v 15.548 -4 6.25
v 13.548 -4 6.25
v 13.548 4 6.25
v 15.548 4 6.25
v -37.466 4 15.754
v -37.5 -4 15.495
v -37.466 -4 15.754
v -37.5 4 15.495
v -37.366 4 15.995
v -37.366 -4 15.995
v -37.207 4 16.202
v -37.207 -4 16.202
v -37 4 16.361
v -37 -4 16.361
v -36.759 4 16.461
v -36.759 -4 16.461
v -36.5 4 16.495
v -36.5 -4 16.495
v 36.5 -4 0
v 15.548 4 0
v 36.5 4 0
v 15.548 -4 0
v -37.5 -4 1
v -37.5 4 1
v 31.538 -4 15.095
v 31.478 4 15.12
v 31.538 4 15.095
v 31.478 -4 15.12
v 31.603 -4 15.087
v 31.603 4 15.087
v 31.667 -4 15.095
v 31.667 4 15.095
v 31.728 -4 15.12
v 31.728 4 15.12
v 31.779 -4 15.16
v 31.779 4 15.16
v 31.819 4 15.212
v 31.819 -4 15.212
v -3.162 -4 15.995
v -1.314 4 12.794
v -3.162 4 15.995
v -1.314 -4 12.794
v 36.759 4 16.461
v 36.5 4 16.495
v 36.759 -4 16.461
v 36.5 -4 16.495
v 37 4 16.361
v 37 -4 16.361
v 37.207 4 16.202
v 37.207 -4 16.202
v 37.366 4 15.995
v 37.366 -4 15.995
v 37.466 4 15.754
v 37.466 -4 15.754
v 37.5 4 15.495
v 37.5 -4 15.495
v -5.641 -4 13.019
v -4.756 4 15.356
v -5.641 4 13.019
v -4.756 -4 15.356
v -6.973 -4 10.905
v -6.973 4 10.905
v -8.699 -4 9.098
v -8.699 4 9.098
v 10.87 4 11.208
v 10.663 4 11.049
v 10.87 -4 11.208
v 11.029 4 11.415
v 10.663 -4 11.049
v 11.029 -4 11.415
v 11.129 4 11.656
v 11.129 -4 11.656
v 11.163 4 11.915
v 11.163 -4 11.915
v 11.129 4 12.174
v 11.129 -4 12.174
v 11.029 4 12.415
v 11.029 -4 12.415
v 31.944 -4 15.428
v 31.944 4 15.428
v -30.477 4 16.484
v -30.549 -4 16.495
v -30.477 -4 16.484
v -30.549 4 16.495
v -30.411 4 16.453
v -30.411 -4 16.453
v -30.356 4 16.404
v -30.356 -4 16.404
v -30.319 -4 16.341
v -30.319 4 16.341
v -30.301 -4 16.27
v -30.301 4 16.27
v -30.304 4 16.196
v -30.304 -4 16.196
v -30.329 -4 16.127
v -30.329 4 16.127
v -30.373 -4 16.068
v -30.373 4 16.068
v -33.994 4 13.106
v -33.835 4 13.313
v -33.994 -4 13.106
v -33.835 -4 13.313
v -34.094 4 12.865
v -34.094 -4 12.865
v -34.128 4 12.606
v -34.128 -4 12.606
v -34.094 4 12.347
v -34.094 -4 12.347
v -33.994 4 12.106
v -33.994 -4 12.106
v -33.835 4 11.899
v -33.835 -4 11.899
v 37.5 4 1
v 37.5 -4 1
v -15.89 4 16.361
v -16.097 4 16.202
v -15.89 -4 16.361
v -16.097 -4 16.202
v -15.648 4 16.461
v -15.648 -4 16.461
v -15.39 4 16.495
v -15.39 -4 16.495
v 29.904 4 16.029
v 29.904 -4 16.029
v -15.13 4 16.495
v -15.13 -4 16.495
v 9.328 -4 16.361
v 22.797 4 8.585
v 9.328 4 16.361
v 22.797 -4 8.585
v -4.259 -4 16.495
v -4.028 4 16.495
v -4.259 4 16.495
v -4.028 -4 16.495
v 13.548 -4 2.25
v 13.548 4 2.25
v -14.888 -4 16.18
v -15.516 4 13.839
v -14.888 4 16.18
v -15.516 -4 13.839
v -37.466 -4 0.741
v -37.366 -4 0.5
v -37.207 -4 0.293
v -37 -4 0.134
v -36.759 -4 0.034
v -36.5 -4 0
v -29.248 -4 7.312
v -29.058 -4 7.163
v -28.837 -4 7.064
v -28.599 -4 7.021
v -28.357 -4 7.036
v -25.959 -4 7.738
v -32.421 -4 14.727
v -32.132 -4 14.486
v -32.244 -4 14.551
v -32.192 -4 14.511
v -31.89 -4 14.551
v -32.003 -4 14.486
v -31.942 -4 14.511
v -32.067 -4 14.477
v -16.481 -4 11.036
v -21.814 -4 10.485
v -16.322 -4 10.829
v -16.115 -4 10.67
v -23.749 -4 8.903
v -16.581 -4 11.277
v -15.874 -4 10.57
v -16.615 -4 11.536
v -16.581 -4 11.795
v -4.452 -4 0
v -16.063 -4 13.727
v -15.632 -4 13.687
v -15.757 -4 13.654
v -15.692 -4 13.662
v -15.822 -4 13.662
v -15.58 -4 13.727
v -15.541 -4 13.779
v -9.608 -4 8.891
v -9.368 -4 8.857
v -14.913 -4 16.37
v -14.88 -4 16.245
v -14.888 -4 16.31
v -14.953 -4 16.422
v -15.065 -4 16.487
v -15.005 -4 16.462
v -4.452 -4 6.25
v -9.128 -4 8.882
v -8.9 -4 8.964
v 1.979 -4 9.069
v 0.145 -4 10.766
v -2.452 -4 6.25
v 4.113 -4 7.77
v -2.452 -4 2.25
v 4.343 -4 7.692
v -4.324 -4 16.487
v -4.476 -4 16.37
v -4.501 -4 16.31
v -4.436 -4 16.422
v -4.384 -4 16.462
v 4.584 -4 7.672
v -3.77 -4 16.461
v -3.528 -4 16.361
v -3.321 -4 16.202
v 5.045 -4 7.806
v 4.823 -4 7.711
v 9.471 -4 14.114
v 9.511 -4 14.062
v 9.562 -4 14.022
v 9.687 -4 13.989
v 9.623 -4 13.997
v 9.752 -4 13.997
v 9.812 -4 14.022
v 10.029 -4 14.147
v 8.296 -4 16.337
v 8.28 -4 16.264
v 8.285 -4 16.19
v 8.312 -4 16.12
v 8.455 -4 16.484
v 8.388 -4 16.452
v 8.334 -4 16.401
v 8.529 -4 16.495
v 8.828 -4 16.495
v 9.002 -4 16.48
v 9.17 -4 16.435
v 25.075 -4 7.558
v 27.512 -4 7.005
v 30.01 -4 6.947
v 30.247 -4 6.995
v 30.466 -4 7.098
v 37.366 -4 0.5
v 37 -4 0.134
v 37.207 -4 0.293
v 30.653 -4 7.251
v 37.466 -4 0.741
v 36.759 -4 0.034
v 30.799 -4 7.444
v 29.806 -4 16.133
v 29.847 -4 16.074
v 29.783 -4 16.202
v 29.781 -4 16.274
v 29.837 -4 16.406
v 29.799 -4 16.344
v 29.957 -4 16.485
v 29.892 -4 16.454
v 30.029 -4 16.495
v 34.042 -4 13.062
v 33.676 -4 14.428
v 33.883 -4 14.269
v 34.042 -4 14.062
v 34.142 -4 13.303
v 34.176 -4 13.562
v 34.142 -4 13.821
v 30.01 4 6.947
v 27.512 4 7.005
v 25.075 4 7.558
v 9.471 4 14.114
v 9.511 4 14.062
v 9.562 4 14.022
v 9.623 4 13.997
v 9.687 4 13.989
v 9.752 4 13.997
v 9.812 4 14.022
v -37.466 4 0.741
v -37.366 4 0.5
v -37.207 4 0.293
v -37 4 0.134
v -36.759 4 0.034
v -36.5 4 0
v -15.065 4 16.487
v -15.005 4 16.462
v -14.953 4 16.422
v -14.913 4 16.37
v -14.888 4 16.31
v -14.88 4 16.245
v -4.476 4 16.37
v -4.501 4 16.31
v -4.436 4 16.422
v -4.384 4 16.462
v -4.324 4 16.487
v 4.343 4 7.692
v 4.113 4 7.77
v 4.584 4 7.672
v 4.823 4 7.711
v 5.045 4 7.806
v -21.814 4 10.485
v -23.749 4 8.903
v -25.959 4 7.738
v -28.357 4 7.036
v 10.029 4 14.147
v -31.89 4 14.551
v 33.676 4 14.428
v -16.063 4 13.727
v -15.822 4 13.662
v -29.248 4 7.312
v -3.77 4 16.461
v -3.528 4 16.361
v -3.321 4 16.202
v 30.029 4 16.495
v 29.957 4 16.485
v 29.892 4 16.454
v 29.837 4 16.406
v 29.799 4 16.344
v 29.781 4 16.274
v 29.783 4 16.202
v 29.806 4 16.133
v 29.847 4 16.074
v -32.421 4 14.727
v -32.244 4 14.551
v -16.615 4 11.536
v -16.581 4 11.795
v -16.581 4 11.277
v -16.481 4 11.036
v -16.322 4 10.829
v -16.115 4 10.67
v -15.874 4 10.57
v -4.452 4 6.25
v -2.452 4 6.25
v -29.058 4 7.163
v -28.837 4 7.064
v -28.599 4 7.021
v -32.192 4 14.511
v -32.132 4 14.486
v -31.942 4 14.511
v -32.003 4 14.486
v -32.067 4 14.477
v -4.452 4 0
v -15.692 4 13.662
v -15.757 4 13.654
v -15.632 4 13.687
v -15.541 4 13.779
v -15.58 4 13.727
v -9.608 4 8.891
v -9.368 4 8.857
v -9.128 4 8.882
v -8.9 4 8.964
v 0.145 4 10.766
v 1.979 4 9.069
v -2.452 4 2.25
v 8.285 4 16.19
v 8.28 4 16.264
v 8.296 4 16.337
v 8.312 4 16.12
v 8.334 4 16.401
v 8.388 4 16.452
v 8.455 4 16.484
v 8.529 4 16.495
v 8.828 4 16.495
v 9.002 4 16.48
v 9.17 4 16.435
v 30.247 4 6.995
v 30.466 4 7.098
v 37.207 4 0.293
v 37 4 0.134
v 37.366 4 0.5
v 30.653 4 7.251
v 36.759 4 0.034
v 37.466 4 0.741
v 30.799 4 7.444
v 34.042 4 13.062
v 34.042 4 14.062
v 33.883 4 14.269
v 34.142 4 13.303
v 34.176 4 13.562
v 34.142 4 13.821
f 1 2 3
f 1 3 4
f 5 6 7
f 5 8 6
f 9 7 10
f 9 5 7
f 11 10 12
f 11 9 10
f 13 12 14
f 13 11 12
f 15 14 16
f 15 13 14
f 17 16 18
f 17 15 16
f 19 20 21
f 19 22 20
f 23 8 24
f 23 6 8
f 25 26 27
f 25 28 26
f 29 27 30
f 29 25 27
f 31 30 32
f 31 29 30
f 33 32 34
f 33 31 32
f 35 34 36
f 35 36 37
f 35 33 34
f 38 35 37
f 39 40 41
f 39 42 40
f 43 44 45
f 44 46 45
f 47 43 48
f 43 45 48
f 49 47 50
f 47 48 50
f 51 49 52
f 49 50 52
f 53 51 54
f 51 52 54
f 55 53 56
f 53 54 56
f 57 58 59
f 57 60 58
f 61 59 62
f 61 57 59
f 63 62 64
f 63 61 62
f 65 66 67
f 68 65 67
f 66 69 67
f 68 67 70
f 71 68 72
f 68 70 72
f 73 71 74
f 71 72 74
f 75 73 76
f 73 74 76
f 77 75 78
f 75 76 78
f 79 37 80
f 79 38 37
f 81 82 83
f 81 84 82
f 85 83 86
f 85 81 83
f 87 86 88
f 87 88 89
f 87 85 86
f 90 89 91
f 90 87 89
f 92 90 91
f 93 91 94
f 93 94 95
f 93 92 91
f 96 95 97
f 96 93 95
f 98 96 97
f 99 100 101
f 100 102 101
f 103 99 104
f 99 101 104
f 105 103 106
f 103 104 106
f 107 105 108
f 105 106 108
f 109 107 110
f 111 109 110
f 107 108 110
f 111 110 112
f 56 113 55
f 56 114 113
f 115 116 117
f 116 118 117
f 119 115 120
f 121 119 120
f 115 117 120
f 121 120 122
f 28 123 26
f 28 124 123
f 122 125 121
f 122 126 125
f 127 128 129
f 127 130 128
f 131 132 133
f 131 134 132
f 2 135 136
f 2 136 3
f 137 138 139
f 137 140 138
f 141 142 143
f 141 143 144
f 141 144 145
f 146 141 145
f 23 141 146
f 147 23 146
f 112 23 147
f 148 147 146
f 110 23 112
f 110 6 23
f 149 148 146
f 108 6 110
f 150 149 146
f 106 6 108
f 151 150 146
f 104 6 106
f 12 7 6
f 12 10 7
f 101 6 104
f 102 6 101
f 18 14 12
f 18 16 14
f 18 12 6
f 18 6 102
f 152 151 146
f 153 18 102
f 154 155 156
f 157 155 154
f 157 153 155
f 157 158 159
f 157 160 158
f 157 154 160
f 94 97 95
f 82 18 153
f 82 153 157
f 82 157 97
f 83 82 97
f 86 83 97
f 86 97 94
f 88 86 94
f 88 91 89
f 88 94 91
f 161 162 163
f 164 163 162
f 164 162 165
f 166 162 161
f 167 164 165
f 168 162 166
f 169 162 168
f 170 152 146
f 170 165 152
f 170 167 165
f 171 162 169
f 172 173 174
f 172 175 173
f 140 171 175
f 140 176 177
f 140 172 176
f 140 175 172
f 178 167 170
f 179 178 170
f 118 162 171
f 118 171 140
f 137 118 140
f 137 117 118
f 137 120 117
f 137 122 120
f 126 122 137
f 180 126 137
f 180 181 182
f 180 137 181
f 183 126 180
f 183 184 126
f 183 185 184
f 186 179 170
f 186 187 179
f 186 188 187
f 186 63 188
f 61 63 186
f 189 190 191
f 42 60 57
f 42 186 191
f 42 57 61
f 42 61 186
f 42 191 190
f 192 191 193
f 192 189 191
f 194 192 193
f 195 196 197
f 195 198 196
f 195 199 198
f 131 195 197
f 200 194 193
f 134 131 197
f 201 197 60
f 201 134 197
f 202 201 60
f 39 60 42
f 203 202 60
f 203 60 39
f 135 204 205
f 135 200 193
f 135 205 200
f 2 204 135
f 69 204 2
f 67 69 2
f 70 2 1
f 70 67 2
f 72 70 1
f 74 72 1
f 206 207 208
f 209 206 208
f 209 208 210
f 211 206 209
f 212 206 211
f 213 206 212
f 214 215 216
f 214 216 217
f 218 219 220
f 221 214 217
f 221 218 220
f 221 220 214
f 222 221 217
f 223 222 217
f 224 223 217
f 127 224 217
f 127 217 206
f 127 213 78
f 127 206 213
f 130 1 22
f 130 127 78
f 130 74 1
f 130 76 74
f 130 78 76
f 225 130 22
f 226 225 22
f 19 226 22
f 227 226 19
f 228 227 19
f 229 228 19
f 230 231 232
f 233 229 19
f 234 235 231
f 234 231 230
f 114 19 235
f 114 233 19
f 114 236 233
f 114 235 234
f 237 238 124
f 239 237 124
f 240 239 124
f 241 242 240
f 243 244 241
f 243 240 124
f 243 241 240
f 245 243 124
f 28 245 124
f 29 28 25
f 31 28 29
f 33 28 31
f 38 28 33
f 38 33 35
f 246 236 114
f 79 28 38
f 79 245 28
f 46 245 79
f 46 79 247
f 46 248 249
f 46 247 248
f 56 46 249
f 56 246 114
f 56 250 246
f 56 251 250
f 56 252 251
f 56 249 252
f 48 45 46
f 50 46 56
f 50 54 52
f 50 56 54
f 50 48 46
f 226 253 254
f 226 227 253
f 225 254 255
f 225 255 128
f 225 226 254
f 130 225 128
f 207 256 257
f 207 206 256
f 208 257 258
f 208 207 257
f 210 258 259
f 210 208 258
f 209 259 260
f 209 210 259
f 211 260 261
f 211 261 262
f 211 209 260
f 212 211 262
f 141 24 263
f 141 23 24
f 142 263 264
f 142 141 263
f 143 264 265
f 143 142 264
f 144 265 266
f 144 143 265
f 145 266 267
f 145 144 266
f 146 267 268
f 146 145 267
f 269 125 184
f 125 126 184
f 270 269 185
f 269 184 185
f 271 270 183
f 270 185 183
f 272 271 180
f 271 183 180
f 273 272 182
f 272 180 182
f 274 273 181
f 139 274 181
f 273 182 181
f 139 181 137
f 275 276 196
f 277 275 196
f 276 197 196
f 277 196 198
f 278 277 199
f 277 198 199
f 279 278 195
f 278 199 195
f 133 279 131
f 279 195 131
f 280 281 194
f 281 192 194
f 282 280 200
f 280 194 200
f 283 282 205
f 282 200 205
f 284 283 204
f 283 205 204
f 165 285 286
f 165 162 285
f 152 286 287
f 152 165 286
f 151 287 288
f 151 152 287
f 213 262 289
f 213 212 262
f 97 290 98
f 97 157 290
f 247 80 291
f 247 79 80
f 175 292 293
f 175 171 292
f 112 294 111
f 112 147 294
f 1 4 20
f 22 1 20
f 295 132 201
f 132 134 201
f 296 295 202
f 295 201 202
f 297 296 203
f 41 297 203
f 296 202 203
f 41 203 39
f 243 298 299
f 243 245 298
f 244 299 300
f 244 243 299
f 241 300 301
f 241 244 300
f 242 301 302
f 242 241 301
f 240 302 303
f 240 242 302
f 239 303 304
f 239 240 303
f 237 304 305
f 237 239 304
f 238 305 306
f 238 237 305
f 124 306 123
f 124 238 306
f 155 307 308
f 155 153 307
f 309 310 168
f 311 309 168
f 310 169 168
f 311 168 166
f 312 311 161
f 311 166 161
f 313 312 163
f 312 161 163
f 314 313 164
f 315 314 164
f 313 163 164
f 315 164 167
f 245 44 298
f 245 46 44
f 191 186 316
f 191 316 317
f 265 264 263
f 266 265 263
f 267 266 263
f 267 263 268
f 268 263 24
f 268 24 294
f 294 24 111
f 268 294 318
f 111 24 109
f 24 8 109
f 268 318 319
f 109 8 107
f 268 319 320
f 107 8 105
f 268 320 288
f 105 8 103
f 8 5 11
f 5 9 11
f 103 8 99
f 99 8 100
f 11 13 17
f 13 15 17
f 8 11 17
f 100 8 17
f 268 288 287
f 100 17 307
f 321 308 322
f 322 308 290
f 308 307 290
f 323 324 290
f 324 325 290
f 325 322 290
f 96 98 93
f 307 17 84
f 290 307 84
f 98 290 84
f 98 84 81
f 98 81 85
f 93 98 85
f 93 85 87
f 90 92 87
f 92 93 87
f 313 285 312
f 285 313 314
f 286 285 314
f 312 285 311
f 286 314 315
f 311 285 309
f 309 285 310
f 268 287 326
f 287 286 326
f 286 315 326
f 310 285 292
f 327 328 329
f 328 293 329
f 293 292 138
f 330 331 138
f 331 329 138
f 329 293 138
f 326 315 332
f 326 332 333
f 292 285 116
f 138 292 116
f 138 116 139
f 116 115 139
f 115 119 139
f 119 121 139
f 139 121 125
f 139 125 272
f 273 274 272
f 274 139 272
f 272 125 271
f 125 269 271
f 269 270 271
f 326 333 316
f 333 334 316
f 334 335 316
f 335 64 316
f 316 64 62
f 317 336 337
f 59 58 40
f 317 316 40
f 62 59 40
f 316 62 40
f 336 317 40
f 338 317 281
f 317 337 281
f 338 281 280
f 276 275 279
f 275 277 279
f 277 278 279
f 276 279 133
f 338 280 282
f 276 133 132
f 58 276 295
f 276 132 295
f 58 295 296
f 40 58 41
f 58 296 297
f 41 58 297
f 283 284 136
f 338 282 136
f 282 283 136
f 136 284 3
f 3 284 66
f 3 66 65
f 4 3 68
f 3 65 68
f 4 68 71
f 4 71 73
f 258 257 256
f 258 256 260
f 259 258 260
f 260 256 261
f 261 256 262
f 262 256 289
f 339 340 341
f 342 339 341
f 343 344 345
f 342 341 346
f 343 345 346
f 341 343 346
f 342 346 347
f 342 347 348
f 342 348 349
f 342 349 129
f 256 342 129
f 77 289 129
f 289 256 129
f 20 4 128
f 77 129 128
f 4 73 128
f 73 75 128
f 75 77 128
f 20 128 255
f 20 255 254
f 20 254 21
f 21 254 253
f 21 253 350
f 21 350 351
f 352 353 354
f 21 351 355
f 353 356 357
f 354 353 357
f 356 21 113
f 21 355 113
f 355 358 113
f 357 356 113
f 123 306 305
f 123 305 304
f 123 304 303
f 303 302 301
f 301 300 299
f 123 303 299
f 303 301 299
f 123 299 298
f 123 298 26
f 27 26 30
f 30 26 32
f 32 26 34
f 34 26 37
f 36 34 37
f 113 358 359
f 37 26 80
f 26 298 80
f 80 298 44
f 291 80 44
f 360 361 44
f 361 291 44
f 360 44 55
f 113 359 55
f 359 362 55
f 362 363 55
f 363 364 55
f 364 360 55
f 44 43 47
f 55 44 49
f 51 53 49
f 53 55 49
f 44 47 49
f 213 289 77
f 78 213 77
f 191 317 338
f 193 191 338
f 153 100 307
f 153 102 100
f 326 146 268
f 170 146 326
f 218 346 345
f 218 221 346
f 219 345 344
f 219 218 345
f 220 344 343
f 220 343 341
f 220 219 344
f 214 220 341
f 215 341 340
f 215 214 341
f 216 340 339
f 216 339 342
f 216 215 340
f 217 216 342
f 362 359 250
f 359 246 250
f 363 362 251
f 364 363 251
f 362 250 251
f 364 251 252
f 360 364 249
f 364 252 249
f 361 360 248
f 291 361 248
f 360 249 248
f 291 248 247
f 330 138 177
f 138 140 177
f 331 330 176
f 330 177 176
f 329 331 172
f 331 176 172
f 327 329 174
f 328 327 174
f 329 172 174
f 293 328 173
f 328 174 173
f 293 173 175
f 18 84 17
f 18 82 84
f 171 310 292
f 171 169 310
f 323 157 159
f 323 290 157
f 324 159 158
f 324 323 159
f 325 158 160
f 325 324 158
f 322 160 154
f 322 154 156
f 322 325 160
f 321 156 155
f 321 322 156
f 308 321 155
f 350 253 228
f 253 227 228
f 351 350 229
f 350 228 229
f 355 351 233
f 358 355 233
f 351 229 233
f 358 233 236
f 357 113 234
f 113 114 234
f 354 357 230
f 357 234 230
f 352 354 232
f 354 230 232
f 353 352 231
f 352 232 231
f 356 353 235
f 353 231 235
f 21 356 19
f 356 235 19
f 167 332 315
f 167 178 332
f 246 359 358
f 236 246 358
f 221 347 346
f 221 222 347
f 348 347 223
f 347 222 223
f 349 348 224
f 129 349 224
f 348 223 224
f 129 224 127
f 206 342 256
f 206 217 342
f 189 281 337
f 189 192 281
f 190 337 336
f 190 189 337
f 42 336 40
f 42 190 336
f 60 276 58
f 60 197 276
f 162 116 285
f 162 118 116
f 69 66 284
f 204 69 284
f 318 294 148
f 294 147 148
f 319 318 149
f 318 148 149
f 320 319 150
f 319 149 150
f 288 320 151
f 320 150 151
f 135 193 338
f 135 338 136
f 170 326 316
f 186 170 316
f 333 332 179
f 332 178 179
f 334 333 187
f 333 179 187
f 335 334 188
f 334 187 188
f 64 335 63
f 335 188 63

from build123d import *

# Parameters (mm, degrees)
F2_DEPTH = 4
F3_R     = 1
F4_R     = 0.25


# Not quite as in the source:
# - a feature names something its author has since deleted; it is built from what else it names


with BuildPart() as f2:
    # F1 (on Front) → F2 (new body, symmetric)
    with BuildSketch(Plane.XZ):
        with BuildLine():
            Line((-37.5, 16.4951905284), (-37.5, 0))
            Line((-37.5, 0), (-4.4515441619, 0))
            Line((-4.4515441619, 0), (-4.4515441619, 6.25))
            Line((-4.4515441619, 6.25), (-2.4515441619, 6.25))
            Line((-2.4515441619, 6.25), (-2.4515441619, 2.25))
            Line((-2.4515441619, 2.25), (13.5484558381, 2.25))
            Line((13.5484558381, 2.25), (13.5484558381, 6.25))
            Line((13.5484558381, 6.25), (15.5484558381, 6.25))
            Line((15.5484558381, 6.25), (15.5484558381, 0))
            Line((15.5484558381, 0), (37.5, 0))
            Line((37.5, 0), (37.5, 16.4951905284))
            Line((37.5, 16.4951905284), (29.0959722333, 16.4951905284))
            Line((29.0959722333, 16.4951905284), (31.6940484447, 14.9951905284))
            Line((31.6940484447, 14.9951905284), (31.9440484447, 15.4282032303))
            Line((31.9440484447, 15.4282032303), (34.542124656, 13.9282032303))
            Line((34.542124656, 13.9282032303), (30.542124656, 7))
            ThreePointArc((30.542124656, 7), (26.5409294992, 7.164032547), (22.7969341276, 8.5849364905))
            Line((22.7969341276, 8.5849364905), (9.0959722333, 16.4951905284))
            Line((9.0959722333, 16.4951905284), (8.0959722333, 16.4951905284))
            Line((8.0959722333, 16.4951905284), (9.5959722333, 13.897114317))
            Line((9.5959722333, 13.897114317), (10.0289849352, 14.147114317))
            Line((10.0289849352, 14.147114317), (11.5289849352, 11.5490381057))
            Line((11.5289849352, 11.5490381057), (4.6007817049, 7.5490381057))
            ThreePointArc((4.6007817049, 7.5490381057), (1.2176613272, 9.6916920368), (-1.3142818045, 12.7942286341))
            Line((-1.3142818045, 12.7942286341), (-3.4510331505, 16.4951905284))
            Line((-3.4510331505, 16.4951905284), (-4.4510331505, 16.4951905284))
            Line((-4.4510331505, 16.4951905284), (-4.756308124, 15.3558888168))
            ThreePointArc((-4.756308124, 15.3558888168), (-6.3989818261, 11.7037534869), (-9.112265528, 8.7584927324))
            Line((-9.112265528, 8.7584927324), (-16.8396721383, 10.8290450932))
            Line((-16.8396721383, 10.8290450932), (-16.063215003, 13.7268225721))
            Line((-16.063215003, 13.7268225721), (-15.5802520899, 13.5974130495))
            Line((-15.5802520899, 13.5974130495), (-14.8037949546, 16.4951905284))
            Line((-14.8037949546, 16.4951905284), (-15.8037949546, 16.4951905284))
            Line((-15.8037949546, 16.4951905284), (-21.8142025947, 10.4847828883))
            ThreePointArc((-21.8142025947, 10.4847828883), (-25.0628674157, 8.1432777656), (-28.8852704065, 6.9492489824))
            Line((-28.8852704065, 6.9492489824), (-34.542124656, 12.6061032319))
            Line((-34.542124656, 12.6061032319), (-32.4208043125, 14.7274235754))
            Line((-32.4208043125, 14.7274235754), (-32.0672509219, 14.3738701848))
            Line((-32.0672509219, 14.3738701848), (-29.9459305783, 16.4951905284))
            Line((-29.9459305783, 16.4951905284), (-37.5, 16.4951905284))
        make_face()
    extrude(amount=F2_DEPTH, both=True)

    # F3
    f3_edges = [f2.edges().sort_by_distance(p)[0] for p in [
        (-37.5, 0, 0),
        (37.5, 0, 0),
        (37.5, 0, 16.495191),
        (9.095972, 0, 16.495191),
        (30.542125, 0, 7),
        (4.600782, 0, 7.549038),
        (34.542125, 0, 13.928203),
        (-9.112266, 0, 8.758493),
        (-28.88527, 0, 6.949249),
        (-3.451033, 0, 16.495191),
        (-1.314282, 0, 12.794229),
        (-15.803795, 0, 16.495191),
        (-37.5, 0, 16.495191),
        (11.528985, 0, 11.549038),
        (-16.839672, 0, 10.829045),
        (-34.542125, 0, 12.606103),
    ]]
    fillet(f3_edges, radius=F3_R)

    # F4
    f4_edges = [f2.edges().sort_by_distance(p)[0] for p in [
        (29.095972, 0, 16.495191),
        (-4.451033, 0, 16.495191),
        (-14.803795, 0, 16.495191),
        (-29.945931, 0, 16.495191),
        (31.694048, 0, 14.995191),
        (-15.580252, 0, 13.597413),
        (-32.067251, 0, 14.37387),
        (9.595972, 0, 13.897114),
        (8.095972, 0, 16.495191),
    ]]
    fillet(f4_edges, radius=F4_R)


solid = f2.part
